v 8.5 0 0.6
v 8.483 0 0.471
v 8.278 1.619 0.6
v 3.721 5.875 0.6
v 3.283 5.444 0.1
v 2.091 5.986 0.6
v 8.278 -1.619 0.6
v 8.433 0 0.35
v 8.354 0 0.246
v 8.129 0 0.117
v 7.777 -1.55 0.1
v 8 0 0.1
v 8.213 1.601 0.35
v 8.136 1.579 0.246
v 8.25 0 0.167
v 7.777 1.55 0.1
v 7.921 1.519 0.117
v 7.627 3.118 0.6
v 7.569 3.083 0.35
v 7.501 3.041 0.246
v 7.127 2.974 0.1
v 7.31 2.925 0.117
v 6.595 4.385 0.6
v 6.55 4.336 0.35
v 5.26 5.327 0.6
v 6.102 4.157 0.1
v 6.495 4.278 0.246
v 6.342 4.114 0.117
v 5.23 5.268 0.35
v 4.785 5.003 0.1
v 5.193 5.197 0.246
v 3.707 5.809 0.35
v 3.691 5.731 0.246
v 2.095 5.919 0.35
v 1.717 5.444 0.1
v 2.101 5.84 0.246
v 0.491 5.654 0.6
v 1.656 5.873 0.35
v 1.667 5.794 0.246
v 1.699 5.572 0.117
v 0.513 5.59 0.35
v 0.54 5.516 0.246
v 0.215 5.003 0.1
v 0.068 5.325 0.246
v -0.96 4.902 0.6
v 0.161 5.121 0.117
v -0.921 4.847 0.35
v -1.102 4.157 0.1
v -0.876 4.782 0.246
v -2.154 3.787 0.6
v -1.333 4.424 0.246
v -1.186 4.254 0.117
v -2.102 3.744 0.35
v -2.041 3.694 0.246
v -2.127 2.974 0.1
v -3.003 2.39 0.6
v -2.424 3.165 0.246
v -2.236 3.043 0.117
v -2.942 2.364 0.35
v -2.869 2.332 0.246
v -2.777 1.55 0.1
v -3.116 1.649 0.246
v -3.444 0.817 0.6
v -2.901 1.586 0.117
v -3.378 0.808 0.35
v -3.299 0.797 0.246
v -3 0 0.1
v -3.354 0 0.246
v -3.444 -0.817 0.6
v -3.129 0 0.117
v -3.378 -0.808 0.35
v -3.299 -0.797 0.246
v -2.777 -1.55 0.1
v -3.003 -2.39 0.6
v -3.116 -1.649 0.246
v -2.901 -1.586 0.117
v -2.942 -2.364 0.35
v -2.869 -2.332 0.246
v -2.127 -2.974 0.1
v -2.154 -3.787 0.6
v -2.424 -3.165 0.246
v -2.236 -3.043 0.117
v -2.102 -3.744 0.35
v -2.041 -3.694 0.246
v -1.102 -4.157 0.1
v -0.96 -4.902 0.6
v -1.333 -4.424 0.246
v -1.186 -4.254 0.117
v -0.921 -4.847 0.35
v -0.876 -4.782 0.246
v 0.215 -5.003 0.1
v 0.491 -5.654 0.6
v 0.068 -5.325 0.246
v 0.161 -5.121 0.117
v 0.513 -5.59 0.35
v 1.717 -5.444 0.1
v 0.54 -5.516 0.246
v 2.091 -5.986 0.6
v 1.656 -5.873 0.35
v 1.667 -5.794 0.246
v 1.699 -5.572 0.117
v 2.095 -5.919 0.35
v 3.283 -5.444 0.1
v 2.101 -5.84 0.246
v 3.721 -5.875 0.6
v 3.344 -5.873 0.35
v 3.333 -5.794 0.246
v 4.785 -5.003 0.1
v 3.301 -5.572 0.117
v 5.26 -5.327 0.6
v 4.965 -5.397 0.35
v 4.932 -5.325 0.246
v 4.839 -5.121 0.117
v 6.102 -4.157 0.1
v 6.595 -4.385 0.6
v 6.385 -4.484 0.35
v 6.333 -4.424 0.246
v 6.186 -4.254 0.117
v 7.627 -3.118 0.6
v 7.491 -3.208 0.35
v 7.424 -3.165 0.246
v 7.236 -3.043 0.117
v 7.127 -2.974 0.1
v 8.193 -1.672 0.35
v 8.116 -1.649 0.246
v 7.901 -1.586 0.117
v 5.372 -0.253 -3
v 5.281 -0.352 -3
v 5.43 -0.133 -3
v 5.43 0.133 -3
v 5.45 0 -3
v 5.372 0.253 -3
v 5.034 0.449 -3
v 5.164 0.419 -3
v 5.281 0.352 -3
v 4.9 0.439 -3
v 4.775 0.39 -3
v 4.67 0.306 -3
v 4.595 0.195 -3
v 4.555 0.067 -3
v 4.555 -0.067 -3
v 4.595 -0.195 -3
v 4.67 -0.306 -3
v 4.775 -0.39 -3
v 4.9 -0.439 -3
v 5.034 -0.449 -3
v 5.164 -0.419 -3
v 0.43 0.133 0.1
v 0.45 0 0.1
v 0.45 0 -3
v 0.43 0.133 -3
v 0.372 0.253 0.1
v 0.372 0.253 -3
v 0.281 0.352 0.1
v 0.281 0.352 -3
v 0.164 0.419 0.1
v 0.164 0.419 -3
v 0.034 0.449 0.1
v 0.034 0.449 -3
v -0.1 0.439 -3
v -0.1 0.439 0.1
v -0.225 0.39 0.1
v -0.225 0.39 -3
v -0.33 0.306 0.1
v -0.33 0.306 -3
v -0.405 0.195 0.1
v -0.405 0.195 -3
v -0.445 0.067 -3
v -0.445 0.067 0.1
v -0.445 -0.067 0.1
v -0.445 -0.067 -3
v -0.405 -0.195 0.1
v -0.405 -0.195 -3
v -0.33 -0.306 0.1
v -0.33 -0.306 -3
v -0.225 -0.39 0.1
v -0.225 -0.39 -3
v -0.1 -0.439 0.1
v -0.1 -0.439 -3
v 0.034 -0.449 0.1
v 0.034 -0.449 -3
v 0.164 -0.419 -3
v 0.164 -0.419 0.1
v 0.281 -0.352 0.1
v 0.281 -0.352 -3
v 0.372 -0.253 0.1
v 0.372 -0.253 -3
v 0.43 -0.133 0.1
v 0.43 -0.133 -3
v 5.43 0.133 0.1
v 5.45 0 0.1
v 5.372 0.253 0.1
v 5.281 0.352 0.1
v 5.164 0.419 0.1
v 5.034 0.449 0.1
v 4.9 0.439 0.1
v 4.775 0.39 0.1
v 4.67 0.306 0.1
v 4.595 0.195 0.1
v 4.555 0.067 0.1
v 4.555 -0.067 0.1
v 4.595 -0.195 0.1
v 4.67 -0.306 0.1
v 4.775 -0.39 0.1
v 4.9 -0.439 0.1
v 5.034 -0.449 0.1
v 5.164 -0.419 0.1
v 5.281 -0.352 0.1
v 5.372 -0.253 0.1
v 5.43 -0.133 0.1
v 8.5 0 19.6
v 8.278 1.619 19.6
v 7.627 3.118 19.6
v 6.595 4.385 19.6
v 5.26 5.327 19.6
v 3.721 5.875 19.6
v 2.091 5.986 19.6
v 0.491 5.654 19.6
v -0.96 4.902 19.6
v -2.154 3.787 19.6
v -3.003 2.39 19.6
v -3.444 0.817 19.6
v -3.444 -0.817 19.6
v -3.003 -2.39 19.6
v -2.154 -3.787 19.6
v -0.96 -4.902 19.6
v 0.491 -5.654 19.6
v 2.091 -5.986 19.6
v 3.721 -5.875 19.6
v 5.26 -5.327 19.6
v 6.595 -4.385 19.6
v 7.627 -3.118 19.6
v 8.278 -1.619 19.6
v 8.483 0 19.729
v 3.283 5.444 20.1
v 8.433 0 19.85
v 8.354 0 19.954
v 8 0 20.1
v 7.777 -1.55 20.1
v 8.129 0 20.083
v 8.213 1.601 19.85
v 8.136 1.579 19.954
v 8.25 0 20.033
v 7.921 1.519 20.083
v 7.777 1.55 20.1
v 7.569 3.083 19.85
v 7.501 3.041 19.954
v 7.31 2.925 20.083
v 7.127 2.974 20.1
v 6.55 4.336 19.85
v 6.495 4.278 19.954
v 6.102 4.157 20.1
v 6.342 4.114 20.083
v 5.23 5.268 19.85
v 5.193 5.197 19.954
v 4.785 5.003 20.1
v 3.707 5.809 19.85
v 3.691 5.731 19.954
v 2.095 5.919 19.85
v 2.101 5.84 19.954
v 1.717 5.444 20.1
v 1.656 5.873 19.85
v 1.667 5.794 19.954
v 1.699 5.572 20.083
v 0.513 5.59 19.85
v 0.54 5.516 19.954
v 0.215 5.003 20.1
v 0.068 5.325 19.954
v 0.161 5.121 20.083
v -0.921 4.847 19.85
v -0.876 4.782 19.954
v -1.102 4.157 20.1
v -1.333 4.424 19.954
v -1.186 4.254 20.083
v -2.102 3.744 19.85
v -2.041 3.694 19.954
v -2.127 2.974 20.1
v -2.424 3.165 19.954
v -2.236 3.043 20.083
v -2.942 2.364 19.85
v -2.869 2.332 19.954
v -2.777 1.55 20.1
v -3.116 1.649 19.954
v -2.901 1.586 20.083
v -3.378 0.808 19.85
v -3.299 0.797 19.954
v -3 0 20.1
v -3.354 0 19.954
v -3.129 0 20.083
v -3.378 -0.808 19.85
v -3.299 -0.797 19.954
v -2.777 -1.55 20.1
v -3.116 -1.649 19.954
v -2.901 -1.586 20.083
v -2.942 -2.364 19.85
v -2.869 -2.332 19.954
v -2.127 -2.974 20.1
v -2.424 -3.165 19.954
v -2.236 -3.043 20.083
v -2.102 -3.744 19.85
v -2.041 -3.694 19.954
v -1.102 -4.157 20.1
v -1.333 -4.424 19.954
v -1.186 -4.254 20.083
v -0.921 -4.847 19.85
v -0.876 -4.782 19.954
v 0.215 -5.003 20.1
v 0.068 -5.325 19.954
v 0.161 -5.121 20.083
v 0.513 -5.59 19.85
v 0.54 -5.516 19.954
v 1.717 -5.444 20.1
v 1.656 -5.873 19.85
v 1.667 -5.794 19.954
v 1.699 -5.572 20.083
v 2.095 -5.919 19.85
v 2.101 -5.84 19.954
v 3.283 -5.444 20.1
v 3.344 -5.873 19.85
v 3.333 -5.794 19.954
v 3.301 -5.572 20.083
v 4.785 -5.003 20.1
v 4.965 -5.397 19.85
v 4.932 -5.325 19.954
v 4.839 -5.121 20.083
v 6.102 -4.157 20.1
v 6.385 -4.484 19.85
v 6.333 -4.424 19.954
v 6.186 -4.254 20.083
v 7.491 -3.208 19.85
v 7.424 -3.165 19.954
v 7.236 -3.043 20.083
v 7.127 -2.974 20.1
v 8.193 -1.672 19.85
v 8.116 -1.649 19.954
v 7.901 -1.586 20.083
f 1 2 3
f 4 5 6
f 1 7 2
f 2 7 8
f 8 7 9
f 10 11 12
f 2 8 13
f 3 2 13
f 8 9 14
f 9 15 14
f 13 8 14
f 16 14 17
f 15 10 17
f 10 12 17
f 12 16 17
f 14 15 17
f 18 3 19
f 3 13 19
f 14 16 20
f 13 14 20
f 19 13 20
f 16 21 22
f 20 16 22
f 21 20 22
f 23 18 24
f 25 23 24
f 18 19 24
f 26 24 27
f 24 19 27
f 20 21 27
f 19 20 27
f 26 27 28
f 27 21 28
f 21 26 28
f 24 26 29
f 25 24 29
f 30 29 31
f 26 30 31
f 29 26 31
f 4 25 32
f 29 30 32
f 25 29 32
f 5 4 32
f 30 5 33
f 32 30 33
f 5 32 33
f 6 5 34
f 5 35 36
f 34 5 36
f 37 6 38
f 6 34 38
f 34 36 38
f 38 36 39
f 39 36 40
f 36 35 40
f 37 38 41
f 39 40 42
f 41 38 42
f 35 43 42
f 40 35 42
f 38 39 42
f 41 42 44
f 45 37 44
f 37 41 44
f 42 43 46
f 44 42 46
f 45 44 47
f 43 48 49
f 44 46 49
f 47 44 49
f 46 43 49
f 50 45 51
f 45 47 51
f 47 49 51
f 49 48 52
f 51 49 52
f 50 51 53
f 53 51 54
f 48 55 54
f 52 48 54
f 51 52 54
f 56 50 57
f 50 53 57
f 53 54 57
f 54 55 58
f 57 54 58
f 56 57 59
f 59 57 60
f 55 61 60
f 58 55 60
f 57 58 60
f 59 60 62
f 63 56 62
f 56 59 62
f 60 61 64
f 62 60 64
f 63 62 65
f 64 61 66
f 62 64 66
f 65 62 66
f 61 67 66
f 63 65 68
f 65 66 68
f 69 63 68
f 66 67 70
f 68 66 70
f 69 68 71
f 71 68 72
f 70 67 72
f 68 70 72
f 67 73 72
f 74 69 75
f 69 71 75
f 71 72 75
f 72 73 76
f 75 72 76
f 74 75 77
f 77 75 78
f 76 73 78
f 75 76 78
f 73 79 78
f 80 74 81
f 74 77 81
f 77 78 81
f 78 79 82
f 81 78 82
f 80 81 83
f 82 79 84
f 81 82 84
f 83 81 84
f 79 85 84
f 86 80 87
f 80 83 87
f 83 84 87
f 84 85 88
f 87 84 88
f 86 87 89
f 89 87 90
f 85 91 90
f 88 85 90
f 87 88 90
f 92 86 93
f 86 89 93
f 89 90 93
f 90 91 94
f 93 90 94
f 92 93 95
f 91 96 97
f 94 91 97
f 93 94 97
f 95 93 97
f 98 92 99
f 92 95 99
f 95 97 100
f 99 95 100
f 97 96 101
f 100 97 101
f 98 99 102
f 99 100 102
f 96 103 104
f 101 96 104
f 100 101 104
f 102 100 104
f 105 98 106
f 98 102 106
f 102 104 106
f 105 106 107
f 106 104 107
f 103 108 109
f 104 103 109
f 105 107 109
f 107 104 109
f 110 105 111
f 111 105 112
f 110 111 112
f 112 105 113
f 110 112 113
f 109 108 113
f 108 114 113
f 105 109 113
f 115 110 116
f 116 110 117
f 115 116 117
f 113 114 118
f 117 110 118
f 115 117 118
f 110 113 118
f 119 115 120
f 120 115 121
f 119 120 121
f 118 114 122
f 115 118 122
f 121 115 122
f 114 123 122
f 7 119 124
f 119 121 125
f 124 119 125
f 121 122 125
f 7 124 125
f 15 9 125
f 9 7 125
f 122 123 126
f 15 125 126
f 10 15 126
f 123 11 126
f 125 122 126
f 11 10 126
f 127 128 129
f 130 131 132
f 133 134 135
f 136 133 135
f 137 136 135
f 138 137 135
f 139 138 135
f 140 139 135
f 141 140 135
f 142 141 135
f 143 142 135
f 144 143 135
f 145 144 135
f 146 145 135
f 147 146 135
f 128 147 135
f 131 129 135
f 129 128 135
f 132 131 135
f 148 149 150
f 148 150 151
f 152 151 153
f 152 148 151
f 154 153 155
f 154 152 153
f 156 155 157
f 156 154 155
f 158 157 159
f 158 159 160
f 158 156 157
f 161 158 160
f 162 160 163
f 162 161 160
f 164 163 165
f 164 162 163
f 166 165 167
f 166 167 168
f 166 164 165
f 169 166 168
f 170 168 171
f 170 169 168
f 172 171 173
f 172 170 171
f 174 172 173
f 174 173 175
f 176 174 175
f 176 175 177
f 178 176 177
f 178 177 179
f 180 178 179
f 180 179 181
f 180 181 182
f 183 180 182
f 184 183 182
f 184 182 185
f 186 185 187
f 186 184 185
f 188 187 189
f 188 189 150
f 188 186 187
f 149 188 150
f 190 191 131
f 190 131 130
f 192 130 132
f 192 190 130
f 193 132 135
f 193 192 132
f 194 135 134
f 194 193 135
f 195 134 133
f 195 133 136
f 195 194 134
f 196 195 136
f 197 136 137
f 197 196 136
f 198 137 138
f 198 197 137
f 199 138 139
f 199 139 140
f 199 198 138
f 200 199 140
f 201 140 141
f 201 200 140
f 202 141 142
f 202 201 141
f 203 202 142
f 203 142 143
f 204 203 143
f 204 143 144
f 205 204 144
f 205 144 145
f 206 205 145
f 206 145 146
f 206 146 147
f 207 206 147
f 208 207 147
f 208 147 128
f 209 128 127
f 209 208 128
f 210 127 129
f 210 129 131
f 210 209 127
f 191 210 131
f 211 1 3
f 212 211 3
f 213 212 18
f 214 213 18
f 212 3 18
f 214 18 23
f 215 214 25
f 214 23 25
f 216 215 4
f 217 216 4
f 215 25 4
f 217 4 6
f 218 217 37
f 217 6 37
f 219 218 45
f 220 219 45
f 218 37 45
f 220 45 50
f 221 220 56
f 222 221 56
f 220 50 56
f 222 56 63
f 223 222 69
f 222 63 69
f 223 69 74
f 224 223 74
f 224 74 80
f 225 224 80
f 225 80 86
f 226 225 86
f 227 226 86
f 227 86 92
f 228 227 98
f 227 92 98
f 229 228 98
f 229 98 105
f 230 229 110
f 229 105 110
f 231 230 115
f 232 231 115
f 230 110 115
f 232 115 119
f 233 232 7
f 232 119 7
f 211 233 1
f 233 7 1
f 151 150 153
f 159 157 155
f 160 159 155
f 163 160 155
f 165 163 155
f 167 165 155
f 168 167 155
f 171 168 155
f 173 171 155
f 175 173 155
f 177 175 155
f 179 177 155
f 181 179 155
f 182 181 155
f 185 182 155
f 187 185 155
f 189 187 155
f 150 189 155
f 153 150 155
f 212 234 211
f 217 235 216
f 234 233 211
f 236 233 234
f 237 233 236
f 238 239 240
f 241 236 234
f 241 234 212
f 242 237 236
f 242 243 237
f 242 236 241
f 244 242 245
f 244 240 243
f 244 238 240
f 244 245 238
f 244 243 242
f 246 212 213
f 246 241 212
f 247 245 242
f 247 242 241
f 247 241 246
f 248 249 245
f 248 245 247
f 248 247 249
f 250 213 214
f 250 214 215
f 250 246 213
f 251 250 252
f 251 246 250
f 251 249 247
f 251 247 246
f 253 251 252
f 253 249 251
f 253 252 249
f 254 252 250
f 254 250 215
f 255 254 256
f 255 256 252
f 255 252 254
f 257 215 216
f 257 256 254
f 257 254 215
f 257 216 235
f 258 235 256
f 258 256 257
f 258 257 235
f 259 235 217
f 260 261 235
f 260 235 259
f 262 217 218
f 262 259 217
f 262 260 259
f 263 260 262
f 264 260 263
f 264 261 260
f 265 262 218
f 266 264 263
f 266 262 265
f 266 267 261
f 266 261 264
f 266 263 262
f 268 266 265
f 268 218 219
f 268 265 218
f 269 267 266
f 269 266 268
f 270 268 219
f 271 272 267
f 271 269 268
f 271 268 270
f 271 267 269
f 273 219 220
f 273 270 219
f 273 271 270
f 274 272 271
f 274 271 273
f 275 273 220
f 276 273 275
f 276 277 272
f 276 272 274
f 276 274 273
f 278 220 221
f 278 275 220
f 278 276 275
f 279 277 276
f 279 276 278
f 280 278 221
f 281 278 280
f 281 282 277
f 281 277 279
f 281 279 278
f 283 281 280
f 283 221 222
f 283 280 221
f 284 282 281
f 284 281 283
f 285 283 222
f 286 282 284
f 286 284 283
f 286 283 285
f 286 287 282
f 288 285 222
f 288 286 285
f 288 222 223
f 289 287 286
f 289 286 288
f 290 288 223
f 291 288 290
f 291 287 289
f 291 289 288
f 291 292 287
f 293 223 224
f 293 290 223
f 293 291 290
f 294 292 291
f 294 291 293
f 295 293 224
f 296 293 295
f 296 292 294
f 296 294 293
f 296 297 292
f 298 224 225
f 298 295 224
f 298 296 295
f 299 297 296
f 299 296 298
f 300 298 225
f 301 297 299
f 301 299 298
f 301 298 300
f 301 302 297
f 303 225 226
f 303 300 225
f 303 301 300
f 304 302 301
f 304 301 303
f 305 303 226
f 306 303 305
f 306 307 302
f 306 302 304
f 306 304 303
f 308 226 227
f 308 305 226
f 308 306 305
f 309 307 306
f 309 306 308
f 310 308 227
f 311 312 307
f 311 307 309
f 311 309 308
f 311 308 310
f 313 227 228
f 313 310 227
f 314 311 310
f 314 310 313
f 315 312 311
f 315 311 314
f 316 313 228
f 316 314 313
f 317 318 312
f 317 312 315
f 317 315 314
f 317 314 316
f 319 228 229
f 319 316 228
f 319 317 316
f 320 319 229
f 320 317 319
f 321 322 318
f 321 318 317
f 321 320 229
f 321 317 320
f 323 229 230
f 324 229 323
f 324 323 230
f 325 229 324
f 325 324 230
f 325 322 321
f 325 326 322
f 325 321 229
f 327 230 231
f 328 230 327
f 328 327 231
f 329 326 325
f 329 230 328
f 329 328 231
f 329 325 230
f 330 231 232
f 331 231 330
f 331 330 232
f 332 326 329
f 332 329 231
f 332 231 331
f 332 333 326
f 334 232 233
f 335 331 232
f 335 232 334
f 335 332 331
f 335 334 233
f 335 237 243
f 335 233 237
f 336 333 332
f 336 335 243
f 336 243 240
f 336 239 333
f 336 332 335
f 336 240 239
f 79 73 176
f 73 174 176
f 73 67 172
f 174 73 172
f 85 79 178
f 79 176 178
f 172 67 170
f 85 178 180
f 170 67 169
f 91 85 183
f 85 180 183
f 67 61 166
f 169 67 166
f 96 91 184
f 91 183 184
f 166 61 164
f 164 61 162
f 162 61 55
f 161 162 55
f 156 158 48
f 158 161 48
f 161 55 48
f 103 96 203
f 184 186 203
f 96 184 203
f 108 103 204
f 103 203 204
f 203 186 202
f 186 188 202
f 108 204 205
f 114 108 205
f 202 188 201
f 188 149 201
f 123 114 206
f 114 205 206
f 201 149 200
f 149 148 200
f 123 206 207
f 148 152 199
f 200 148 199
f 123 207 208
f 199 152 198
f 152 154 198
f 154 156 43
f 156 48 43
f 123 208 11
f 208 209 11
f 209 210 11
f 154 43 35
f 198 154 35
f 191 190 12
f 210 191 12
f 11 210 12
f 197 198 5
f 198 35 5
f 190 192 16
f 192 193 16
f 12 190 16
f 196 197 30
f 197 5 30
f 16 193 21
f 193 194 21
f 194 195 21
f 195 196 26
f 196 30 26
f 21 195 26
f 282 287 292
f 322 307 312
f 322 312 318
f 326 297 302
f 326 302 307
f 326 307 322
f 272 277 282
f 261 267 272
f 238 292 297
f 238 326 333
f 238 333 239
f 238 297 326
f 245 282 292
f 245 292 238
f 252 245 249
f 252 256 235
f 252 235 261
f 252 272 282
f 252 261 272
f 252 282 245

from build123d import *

# Parameters (mm, degrees)
SKETCH001_R       = 0.45
PAD001_DEPTH      = 10
PAD001_DEPTH_BACK = 3.5
SKETCH_R          = 6
PAD_DEPTH         = 20
FILLET_R          = 0.5


with BuildPart() as pad001:
    # Sketch001 → Pad001 (new body, two sides)
    with BuildSketch(Plane.XY.offset(0.5)) as pad001_sk:
        Circle(SKETCH001_R)
        with Locations((5, 0)):
            Circle(SKETCH001_R)
    extrude(amount=PAD001_DEPTH)
    extrude(pad001_sk.sketch, amount=-PAD001_DEPTH_BACK)


with BuildPart() as fillet_mp_cp:
    # Sketch → Pad (new body)
    with BuildSketch(Plane.XY.offset(0.1)):
        with Locations((2.5, 0)):
            Circle(SKETCH_R)
    extrude(amount=PAD_DEPTH)

    # Fillet
    fillet_edges = [fillet_mp_cp.edges().sort_by_distance(p)[0] for p in [
        (-3.5, 0, 0.1),
        (-3.5, 0, 20.1),
    ]]
    fillet(fillet_edges, radius=FILLET_R)

    # Fillet_mp_cp: union Pad001
    add(pad001.part)


solid = fillet_mp_cp.part
